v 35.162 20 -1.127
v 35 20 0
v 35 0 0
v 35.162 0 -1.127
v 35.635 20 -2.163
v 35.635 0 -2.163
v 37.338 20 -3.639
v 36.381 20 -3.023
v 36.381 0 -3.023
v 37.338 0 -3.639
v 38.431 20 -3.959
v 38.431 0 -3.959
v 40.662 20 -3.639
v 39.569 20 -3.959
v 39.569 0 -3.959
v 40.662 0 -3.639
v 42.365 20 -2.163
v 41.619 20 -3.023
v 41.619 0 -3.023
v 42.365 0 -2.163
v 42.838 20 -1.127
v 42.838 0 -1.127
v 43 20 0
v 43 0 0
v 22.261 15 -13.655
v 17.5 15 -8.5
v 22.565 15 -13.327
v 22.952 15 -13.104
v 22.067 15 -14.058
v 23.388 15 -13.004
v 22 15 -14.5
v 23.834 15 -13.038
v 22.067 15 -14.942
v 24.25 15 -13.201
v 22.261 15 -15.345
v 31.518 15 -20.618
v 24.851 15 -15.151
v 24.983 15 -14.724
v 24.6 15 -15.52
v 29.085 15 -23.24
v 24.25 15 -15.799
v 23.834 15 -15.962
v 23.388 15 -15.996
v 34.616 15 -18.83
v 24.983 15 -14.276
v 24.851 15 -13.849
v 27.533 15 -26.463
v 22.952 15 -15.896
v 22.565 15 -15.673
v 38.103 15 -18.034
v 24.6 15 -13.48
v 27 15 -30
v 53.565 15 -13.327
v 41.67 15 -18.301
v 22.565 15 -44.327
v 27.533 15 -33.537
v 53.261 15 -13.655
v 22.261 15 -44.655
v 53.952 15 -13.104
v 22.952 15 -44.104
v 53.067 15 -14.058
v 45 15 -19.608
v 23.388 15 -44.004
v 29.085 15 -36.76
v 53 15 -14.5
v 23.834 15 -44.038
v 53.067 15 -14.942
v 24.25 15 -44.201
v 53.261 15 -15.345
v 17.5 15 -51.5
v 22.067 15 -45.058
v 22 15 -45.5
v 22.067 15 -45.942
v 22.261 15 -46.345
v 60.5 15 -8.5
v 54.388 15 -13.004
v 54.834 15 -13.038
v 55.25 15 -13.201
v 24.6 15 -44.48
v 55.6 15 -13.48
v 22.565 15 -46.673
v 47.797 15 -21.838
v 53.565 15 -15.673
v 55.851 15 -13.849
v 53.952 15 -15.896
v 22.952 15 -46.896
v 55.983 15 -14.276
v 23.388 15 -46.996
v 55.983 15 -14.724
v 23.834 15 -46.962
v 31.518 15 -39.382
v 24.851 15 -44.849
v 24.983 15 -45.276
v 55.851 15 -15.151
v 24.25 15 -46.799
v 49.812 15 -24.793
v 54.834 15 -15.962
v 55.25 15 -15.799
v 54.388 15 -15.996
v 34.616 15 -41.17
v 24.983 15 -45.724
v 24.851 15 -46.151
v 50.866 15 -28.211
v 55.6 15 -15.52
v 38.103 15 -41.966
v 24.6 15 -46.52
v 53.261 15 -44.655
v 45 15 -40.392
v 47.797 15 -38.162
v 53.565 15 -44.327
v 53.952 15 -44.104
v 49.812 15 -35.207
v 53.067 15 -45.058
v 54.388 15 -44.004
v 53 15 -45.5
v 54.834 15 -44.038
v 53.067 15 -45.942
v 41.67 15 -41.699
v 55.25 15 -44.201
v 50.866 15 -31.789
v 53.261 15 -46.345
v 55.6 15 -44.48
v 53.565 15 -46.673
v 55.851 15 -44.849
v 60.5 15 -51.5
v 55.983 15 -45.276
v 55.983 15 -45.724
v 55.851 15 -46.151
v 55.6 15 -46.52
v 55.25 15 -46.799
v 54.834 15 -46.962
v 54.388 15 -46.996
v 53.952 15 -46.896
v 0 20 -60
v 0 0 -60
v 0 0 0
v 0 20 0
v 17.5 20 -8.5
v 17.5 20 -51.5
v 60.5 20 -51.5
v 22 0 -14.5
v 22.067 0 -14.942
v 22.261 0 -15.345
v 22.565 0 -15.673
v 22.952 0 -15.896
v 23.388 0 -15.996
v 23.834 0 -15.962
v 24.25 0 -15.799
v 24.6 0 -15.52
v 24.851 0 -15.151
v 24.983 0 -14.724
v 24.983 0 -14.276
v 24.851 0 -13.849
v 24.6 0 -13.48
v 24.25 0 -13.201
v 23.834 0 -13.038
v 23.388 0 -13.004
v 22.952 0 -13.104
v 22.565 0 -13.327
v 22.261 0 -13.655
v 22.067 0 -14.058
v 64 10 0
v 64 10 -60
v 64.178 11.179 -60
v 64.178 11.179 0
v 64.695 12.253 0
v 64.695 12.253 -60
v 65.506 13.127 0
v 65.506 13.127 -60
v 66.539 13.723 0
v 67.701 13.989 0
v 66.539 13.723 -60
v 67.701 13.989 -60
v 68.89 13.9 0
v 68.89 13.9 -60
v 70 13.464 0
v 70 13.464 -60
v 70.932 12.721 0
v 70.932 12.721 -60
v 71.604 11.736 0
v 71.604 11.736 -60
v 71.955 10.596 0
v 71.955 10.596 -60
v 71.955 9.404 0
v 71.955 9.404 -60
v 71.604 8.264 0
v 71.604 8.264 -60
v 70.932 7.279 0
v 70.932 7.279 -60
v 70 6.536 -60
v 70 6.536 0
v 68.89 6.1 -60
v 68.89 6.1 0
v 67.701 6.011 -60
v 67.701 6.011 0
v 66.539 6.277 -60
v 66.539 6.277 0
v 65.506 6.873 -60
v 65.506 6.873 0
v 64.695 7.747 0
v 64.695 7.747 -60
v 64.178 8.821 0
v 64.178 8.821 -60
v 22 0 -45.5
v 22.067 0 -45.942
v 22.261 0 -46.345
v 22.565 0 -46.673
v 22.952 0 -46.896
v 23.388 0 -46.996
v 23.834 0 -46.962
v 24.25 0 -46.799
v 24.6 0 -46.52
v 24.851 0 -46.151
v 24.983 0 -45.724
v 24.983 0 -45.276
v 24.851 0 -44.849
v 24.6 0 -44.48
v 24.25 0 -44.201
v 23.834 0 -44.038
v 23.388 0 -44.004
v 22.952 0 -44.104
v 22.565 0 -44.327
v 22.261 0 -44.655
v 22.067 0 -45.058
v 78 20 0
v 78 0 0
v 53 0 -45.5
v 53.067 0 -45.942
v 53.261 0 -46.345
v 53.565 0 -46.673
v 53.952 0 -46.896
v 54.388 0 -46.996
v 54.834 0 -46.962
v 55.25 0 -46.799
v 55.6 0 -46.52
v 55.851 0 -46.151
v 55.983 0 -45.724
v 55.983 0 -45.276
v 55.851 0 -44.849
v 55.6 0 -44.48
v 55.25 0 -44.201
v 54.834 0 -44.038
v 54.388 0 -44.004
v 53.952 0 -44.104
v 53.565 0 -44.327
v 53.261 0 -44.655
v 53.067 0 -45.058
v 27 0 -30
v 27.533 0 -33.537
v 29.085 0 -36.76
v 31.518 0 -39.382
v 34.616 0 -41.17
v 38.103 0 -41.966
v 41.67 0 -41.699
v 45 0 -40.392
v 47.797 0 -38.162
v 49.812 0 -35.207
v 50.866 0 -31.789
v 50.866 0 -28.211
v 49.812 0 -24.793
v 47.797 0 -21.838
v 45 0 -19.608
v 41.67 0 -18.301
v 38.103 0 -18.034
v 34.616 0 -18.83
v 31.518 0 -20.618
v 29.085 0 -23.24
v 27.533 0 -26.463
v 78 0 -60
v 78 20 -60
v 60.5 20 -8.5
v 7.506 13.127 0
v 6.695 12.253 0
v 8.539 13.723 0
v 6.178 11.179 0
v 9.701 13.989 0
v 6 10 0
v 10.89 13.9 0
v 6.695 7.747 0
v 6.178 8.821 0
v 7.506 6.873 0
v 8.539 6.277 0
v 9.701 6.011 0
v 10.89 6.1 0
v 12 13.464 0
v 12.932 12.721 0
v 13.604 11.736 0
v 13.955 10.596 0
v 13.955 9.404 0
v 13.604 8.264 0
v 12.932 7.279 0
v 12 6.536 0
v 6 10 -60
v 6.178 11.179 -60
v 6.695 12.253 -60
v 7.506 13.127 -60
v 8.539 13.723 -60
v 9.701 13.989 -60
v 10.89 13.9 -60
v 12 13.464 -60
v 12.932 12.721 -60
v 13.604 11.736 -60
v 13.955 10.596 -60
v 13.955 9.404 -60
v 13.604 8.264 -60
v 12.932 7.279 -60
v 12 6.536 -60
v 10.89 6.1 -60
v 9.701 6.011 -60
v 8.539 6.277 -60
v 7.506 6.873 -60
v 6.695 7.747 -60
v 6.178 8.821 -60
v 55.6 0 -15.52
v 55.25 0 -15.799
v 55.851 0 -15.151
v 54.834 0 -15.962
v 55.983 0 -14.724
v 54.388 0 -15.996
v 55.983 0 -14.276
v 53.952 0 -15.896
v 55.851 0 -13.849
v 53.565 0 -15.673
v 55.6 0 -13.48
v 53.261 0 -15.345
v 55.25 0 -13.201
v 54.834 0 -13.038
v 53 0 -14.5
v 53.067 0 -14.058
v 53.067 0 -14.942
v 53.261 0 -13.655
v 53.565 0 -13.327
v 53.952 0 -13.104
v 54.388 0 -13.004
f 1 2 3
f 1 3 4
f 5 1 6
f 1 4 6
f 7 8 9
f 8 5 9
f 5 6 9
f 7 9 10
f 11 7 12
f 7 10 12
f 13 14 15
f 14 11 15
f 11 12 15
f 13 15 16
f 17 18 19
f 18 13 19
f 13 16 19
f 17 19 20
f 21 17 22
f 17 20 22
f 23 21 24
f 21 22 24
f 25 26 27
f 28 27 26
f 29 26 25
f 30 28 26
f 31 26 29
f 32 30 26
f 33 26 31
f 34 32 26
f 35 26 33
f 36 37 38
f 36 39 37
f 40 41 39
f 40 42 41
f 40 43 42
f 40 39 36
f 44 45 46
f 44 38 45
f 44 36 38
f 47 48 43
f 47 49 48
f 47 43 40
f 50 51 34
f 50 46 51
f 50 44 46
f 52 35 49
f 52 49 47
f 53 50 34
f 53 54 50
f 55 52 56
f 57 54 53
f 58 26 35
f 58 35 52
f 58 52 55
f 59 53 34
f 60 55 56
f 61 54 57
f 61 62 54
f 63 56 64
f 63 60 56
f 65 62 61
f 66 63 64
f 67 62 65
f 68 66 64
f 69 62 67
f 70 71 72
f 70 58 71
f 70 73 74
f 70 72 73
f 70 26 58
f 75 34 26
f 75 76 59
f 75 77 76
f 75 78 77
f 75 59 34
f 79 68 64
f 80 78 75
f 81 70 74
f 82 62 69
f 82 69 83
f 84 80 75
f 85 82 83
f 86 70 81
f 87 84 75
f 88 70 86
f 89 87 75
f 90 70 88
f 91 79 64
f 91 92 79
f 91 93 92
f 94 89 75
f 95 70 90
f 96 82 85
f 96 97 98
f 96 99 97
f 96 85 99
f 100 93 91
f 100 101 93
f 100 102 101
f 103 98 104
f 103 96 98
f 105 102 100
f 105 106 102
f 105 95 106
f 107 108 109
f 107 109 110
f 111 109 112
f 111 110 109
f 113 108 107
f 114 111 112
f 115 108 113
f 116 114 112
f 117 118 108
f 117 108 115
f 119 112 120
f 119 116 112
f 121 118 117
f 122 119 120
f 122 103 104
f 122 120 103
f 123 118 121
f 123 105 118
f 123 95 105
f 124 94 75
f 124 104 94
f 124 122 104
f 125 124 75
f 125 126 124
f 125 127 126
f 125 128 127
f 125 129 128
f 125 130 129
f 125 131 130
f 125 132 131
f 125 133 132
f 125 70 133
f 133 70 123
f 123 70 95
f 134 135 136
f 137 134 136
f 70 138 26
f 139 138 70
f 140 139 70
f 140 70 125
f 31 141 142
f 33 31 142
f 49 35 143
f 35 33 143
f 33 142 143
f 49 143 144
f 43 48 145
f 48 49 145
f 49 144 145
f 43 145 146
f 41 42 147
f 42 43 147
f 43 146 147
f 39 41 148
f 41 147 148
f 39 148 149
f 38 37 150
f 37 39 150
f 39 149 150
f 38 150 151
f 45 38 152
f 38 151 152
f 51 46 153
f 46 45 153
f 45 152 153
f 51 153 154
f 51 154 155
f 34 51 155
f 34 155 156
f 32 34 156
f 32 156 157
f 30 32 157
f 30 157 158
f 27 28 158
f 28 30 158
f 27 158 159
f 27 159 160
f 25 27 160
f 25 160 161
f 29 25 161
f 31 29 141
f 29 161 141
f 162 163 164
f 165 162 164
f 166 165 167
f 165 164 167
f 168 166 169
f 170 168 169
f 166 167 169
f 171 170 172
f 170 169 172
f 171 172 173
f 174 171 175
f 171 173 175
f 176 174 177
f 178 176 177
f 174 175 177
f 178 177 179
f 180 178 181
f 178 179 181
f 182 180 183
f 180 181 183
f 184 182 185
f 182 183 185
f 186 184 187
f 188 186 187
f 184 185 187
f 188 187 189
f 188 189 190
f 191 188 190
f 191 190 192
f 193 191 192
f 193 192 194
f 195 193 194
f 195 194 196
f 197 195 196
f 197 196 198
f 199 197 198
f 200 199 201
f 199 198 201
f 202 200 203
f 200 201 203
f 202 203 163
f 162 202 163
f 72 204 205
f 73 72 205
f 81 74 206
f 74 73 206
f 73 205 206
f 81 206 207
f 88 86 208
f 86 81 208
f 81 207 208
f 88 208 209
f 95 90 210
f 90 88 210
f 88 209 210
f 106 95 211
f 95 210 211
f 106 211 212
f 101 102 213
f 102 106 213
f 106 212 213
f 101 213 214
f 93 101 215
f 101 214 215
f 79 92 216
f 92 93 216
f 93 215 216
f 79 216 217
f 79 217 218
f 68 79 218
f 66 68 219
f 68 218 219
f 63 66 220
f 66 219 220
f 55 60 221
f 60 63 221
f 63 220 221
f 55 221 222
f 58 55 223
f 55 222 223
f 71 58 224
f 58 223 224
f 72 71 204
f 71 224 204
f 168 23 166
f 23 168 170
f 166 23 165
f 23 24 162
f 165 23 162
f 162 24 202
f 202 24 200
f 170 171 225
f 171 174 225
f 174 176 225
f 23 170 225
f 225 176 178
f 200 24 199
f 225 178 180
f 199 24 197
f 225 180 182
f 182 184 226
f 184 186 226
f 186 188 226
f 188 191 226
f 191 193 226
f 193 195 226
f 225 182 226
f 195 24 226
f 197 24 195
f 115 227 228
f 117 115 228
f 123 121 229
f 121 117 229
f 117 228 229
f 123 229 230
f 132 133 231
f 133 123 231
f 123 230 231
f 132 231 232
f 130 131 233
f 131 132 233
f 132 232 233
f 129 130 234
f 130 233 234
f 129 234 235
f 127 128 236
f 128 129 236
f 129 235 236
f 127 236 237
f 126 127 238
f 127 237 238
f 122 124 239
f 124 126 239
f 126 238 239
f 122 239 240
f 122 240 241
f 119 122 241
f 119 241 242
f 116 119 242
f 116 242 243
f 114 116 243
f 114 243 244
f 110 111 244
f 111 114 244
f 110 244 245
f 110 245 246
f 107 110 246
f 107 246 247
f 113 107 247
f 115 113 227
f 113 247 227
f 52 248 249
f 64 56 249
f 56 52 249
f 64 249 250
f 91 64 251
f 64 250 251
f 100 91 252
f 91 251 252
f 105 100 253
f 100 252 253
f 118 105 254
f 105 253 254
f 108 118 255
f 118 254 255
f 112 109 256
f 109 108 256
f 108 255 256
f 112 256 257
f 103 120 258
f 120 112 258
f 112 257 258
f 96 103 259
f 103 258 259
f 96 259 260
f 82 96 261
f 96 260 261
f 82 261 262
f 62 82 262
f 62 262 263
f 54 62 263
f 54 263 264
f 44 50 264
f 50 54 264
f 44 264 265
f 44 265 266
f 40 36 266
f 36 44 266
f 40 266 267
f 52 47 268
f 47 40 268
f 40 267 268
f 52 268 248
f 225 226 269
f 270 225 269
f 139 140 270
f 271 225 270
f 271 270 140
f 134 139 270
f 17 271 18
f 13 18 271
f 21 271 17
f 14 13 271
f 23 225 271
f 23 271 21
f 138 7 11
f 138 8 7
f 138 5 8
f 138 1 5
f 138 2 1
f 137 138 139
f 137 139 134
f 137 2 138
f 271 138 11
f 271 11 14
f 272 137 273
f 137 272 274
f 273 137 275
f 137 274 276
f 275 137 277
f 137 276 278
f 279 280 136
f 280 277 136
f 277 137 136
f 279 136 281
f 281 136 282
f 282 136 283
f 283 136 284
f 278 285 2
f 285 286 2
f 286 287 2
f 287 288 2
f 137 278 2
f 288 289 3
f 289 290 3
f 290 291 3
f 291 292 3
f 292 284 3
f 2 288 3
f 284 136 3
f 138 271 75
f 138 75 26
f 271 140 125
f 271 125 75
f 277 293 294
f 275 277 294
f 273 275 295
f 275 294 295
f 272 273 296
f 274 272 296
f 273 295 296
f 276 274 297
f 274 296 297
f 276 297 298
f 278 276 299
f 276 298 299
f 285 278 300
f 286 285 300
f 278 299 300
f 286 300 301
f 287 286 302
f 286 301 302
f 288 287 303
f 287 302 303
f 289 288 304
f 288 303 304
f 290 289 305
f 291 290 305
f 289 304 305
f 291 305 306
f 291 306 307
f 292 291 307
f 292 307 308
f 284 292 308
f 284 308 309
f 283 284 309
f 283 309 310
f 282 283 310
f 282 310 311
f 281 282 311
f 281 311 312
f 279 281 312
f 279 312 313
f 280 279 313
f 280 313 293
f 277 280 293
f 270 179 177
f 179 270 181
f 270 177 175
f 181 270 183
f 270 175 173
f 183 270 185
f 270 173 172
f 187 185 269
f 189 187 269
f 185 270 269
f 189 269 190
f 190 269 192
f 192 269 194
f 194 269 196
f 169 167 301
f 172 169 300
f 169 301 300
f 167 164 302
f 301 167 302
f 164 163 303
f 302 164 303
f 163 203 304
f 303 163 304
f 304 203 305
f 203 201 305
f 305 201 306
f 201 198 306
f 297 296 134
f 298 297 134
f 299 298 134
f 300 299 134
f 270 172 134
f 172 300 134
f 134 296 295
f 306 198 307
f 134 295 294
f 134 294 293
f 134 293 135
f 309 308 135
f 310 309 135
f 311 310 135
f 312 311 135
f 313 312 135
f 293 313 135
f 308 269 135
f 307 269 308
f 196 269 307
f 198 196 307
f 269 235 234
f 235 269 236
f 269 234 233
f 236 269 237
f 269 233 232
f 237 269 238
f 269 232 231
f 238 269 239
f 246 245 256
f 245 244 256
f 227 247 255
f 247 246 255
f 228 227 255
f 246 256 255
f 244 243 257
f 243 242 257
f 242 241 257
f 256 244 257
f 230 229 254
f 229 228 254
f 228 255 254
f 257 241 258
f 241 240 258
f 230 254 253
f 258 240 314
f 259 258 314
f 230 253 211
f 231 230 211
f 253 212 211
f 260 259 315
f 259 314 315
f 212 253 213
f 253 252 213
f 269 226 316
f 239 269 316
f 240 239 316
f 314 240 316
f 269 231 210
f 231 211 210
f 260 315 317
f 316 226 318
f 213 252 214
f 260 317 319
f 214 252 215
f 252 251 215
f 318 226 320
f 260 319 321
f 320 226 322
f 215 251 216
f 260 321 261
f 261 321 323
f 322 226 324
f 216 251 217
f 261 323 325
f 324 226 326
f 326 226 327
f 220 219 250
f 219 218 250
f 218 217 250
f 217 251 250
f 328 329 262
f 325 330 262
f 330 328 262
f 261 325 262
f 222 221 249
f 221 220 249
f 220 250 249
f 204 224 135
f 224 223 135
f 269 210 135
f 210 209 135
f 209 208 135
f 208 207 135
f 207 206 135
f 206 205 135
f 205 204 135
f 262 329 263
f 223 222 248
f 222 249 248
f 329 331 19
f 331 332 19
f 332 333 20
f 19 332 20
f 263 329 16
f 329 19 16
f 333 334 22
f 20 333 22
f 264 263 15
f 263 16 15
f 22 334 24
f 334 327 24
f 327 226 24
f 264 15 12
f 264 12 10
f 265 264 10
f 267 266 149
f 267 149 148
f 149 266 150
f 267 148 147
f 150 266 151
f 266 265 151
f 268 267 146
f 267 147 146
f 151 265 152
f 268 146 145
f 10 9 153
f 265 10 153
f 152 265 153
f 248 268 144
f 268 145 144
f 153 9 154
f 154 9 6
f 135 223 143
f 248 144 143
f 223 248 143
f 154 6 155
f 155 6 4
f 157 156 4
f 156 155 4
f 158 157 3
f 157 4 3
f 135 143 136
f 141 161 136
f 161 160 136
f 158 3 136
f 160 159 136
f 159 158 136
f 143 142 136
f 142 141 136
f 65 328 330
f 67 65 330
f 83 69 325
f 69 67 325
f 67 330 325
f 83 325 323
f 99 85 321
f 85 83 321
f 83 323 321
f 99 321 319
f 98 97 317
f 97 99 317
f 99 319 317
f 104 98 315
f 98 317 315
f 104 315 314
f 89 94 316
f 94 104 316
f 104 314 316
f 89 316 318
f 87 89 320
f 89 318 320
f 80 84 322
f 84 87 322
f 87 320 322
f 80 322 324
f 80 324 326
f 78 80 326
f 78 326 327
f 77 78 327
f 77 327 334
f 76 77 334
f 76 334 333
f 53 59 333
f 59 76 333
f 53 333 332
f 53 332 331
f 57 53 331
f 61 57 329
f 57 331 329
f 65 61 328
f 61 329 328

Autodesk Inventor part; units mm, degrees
ref_plane "YZ Plane" through (0, 0, 0) normal (1, 0, 0) x (0, 1, 0)
ref_plane "XZ Plane" through (0, 0, 0) normal (0, 1, 0) x (-1, 0, 0)
ref_plane "XY Plane" through (0, 0, 0) normal (0, 0, 1) x (1, 0, 0)
sketch "Sketch1" plane through (0, 0, 0) normal (0, 1, 0) x (-1, 0, 0)
  line L0 (-78, 0) -> (-78, -60)
  line L1 (-78, -60) -> (0, -60)
  line L2 (0, -60) -> (0, 0)
  arc A0 (-43, 0) -> (-35, 0) centre (-39, 0) ccw
  circle A1 centre (-39, -30) radius 12
  line L3 (-23.5, -14.5) -> (-54.5, -14.5)
  circle A2 centre (-23.5, -45.5) radius 1.5
  circle A3 centre (-54.5, -45.5) radius 1.5
  circle A4 centre (-54.5, -14.5) radius 1.5
  circle A5 centre (-23.5, -14.5) radius 1.5
  line L4 (0, 0) -> (-35, 0)
  line L5 (-43, 0) -> (-78, 0)
  dimension "d1" = 60
  dimension "d2" = 78
  dimension "d3" = 8
  dimension "d5" = 24
  dimension "d15" = 31
  dimension "d16" = 3
  dimension "d17" = 3
  dimension "d18" = 3
  dimension "d19" = 3
extrude "Extrusion1" add sketch "Sketch1" along normal blind 20
sketch "Sketch2" plane through (78, 0, -60) normal (0, 0, -1) x (-1, 0, 0)
  circle A0 centre (10, 10) radius 4
  circle A1 centre (68, 10) radius 4
  dimension "d24" = 8
  dimension "d25" = 8
extrude "Extrusion2" cut sketch "Sketch2" against normal blind 100
sketch "Sketch3" plane through (0, 20, 0) normal (0, 1, 0) x (1, 0, 0)
  circle A0 centre (39, 30) radius 12 projected
  circle A1 centre (23.5, 14.5) radius 1.5 projected
  circle A2 centre (54.5, 14.5) radius 1.5 projected
  circle A3 centre (54.5, 45.5) radius 1.5 projected
  circle A4 centre (23.5, 45.5) radius 1.5 projected
  line L0 (60.5, 8.5) -> (17.5, 8.5)
  line L1 (17.5, 8.5) -> (17.5, 51.5)
  line L2 (17.5, 51.5) -> (60.5, 51.5)
  line L3 (60.5, 51.5) -> (60.5, 8.5)
  line L4 (60.5, 8.5) -> (17.5, 51.5) construction
  line L5 (17.5, 8.5) -> (60.5, 51.5) construction
  dimension "d28" = 43
  dimension "d29" = 43
extrude "Extrusion3" cut sketch "Sketch3" against normal blind 5
properties part number "Z_MotorMount_RodHolder_V2" material "Birch"
